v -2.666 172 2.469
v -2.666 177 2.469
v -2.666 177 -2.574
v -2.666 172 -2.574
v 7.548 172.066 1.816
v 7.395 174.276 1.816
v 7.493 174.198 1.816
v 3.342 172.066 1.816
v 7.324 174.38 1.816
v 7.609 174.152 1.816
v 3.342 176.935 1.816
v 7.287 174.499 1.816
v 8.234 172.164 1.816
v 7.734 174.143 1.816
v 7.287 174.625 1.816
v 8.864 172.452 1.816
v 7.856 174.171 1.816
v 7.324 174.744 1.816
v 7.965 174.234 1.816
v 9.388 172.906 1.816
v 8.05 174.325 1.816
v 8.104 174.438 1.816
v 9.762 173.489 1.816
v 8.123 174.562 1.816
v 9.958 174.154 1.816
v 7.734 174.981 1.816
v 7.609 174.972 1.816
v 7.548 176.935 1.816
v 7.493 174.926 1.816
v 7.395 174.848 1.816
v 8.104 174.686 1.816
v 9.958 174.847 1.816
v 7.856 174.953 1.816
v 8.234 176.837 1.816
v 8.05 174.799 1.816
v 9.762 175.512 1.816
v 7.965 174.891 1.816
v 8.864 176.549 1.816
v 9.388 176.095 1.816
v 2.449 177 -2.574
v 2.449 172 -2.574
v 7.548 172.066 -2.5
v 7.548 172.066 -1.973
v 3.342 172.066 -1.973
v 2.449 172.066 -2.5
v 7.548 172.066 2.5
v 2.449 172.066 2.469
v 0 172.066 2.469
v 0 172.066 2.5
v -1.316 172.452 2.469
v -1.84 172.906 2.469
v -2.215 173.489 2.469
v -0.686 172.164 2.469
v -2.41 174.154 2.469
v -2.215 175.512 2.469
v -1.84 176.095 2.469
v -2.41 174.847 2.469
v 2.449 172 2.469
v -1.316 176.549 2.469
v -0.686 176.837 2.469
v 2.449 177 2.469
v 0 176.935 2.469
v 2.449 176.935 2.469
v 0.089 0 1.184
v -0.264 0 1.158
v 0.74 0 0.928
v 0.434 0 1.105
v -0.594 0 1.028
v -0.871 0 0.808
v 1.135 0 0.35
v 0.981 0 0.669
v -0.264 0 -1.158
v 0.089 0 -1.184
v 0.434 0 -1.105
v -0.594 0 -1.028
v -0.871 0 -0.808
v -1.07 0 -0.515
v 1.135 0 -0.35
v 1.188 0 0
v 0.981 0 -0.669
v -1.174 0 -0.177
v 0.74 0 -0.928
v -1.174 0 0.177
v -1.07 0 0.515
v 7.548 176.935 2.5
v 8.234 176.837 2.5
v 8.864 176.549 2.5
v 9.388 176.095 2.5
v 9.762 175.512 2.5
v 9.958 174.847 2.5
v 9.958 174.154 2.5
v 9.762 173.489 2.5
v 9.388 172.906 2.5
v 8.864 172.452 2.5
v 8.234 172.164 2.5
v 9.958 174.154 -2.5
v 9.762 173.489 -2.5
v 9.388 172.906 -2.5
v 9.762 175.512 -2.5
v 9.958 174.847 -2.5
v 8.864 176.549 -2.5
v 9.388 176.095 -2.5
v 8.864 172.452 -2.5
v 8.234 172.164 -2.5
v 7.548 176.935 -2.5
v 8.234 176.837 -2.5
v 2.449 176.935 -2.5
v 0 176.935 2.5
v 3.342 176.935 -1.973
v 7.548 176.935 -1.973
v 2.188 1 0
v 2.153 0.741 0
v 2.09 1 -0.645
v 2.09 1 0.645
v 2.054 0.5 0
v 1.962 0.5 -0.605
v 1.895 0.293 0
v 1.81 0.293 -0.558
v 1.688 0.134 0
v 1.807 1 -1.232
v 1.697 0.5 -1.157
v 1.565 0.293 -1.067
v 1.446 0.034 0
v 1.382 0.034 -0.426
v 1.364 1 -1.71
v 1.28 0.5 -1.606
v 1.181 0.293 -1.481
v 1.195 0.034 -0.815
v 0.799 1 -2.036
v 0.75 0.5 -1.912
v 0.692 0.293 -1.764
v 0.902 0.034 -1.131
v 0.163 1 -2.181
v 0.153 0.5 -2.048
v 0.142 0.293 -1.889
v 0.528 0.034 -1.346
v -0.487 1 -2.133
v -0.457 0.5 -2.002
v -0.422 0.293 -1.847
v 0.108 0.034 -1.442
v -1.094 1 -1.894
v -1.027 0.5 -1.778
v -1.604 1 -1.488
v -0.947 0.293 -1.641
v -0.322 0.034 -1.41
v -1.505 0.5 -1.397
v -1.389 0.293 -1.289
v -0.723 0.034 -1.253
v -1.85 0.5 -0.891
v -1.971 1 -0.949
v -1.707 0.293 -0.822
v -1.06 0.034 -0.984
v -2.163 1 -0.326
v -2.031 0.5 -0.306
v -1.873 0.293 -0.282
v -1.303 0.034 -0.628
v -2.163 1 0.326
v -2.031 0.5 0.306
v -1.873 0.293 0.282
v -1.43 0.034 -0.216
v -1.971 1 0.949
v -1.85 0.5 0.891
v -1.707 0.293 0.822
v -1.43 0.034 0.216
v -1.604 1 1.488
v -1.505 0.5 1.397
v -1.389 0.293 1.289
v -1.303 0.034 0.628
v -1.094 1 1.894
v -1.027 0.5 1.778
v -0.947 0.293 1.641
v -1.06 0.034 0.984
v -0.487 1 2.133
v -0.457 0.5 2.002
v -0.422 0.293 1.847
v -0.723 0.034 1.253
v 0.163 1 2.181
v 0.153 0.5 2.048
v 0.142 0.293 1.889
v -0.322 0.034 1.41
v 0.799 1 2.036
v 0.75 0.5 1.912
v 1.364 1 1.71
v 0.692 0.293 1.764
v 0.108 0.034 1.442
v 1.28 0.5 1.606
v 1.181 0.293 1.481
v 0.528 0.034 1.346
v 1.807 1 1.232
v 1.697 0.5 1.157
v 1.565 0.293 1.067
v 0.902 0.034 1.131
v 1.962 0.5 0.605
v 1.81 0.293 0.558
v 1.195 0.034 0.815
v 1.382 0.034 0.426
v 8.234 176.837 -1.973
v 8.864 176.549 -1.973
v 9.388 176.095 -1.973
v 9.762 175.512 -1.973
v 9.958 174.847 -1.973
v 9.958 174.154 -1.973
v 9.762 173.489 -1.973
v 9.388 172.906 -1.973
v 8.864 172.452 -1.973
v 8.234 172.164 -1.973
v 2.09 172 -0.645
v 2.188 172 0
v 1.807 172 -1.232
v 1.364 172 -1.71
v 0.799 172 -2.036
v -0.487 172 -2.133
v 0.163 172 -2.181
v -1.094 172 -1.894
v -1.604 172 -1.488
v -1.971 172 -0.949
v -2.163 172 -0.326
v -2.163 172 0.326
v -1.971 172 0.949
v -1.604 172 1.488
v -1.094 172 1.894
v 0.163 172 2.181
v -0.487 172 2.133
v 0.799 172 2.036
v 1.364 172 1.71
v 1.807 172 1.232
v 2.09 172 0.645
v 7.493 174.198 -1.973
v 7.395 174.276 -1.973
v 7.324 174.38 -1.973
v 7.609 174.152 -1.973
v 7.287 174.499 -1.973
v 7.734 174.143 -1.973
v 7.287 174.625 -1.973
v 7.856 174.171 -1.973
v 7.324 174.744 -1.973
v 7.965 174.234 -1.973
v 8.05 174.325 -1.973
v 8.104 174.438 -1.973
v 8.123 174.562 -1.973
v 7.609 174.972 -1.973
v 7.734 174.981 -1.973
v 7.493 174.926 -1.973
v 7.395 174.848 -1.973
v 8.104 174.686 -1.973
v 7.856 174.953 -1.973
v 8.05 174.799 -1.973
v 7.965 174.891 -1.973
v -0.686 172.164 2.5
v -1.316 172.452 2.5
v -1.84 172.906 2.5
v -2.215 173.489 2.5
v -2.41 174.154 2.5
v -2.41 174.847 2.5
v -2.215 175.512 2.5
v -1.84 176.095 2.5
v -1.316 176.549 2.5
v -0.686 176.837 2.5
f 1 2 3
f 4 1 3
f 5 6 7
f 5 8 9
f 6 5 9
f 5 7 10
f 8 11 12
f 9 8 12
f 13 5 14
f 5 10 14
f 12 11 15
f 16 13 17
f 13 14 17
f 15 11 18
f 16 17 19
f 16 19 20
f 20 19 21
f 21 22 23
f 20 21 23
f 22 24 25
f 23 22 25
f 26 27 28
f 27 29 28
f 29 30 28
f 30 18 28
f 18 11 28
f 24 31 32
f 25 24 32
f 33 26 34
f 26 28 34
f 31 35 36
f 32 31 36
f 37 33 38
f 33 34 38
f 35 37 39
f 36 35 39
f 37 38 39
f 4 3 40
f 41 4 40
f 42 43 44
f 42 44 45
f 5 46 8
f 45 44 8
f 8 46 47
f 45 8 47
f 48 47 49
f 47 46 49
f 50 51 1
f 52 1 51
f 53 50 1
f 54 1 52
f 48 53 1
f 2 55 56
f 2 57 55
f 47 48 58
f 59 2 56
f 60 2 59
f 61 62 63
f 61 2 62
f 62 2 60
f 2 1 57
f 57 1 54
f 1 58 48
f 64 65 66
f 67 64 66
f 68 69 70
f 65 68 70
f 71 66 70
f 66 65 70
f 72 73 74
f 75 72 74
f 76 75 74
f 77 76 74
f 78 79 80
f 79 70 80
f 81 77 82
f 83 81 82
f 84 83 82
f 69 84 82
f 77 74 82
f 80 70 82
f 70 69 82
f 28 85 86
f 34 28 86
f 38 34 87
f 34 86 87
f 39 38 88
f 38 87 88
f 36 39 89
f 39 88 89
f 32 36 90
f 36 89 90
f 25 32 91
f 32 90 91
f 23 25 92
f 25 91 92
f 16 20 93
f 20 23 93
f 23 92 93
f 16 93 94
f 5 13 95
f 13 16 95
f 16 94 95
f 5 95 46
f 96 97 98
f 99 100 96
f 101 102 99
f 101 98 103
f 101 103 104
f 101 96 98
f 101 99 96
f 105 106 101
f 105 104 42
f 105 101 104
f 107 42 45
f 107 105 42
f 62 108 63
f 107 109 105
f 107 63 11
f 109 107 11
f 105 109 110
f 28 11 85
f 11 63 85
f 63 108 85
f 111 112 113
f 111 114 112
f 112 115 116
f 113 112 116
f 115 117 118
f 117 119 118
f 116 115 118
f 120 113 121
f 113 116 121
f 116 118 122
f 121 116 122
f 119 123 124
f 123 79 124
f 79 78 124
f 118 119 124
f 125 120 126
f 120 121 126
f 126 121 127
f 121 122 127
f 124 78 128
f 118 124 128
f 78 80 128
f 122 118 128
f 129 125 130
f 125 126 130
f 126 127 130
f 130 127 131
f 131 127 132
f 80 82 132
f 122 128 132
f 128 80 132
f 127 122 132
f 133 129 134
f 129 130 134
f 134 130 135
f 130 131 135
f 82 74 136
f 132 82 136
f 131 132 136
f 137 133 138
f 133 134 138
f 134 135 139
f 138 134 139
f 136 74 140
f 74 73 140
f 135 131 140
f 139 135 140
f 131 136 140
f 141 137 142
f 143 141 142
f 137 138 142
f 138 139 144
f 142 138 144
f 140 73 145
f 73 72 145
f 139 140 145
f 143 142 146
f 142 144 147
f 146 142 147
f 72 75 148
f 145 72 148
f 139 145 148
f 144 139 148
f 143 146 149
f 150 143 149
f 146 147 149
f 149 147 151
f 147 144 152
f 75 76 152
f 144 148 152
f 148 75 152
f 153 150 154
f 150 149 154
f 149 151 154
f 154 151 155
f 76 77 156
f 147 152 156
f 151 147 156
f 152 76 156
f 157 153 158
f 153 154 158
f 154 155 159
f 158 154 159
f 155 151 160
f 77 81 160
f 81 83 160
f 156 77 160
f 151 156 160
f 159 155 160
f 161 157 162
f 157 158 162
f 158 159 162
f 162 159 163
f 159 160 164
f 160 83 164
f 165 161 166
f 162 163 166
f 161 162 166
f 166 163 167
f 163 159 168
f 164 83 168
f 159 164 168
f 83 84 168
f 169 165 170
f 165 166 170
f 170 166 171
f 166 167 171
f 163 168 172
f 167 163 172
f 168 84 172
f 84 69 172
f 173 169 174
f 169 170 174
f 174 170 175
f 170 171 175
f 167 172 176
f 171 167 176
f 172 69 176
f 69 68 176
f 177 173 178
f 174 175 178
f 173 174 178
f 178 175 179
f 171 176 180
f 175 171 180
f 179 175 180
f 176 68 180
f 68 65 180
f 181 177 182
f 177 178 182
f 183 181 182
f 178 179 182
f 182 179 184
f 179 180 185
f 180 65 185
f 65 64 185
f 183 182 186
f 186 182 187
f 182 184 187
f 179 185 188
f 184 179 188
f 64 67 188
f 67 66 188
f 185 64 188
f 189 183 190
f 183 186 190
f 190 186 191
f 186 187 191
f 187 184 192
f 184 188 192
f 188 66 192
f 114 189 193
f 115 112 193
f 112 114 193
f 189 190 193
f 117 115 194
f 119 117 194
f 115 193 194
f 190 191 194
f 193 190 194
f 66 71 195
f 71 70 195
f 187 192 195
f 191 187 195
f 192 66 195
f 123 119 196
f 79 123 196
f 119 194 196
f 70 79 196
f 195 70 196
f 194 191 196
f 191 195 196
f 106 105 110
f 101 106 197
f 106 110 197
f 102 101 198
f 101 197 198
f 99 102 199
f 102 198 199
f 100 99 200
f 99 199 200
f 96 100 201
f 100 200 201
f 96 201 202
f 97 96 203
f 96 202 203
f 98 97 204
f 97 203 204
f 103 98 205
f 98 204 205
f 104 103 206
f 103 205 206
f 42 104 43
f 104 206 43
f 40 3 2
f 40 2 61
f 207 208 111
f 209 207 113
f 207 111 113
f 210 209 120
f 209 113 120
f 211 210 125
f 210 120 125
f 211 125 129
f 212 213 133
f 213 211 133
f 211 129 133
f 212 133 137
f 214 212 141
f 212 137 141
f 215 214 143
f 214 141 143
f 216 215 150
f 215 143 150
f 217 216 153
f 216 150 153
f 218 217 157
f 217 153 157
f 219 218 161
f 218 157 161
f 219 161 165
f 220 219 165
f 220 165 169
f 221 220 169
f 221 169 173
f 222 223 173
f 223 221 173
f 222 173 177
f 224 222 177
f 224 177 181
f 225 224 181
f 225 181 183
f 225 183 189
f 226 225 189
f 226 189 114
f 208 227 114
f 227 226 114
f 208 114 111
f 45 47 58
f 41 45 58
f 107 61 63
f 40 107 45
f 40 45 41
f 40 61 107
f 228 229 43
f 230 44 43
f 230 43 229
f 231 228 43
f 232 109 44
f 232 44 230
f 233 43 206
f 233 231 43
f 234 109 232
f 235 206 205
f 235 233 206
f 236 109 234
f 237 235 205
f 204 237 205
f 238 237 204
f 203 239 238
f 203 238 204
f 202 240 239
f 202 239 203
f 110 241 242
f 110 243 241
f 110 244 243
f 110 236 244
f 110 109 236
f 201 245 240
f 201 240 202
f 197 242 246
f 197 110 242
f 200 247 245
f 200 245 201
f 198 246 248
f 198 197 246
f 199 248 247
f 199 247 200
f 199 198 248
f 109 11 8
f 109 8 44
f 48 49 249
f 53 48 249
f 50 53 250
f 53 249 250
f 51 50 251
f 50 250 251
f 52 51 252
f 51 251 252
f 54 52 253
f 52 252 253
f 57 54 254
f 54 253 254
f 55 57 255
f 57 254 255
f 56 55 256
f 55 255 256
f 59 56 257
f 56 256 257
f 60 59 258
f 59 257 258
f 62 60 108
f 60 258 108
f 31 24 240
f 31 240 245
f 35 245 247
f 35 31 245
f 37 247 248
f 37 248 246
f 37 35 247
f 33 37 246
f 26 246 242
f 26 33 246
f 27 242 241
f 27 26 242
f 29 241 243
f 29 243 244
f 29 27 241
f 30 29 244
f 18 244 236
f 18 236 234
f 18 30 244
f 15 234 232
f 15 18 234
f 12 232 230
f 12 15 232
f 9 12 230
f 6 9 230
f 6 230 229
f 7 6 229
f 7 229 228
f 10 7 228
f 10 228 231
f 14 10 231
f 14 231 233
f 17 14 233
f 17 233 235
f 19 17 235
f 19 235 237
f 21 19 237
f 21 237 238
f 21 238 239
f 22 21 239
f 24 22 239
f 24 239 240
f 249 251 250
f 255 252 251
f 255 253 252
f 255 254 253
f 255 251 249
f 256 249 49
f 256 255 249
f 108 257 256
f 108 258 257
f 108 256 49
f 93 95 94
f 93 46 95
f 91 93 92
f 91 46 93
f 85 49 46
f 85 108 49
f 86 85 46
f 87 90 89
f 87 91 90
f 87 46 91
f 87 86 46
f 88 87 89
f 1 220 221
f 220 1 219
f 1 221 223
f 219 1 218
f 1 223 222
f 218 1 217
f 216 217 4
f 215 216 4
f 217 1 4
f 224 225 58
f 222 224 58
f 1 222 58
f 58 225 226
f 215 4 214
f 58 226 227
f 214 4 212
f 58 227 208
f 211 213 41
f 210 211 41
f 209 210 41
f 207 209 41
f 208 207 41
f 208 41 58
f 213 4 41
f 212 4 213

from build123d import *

# Parameters (mm, degrees)
IZIM1_R                     = 2.187508585
Y_KSEKLIK_EKSTR_ZYON1_DEPTH = 177
RADYUS1_R                   = 1
IZIM2_W                     = 5.115236905
IZIM2_H                     = 5.042987796
Y_KSEKLIK_EKSTR_ZYON2_DEPTH = 5
Y_KSEKLIK_EKSTR_ZYON3_DEPTH = 2.5
IZIM4_W                     = 9.955982426
IZIM4_H                     = 3.788849983
KES_EKSTR_ZYON1_DEPTH       = 5
IZIM5_R                     = 0.420224292
Y_KSEKLIK_EKSTR_ZYON4_DEPTH = 5


with BuildPart() as part:
    # Çizim1 → Yükseklik-Ekstrüzyon1 (new body)
    with BuildSketch(Plane(origin=(0, 0, 0), x_dir=(1, 0, 0), z_dir=(0, 1, 0))):
        Circle(IZIM1_R)
    extrude(amount=Y_KSEKLIK_EKSTR_ZYON1_DEPTH)

    # Radyus1
    radyus1_edges = [part.edges().sort_by_distance(p)[0] for p in [
        (-2.187508585, 0, 0),
    ]]
    fillet(radyus1_edges, radius=RADYUS1_R)

    # Çizim2 → Yükseklik-Ekstrüzyon2 (add)
    with BuildSketch(Plane(origin=(0, 177, 0), x_dir=(1, 0, 0), z_dir=(0, 1, 0))):
        with Locations((-0.108373663, 0.052171697)):
            Rectangle(IZIM2_W, IZIM2_H)
    extrude(amount=-Y_KSEKLIK_EKSTR_ZYON2_DEPTH)

    # Çizim3 → Yükseklik-Ekstrüzyon3 (add, symmetric)
    with BuildSketch(Plane.XY):
        with BuildLine():
            Line((0, 176.935410542), (7.547644812, 176.935410542))
            ThreePointArc((7.547644812, 176.935410542), (9.98246541, 174.500589945), (7.547644812, 172.065769347))
            Line((7.547644812, 172.065769347), (0, 172.065769347))
            ThreePointArc((0, 172.065769347), (-2.434820598, 174.500589945), (0, 176.935410542))
        make_face()
    extrude(amount=Y_KSEKLIK_EKSTR_ZYON3_DEPTH, both=True)

    # Çizim4 → Kes-Ekstrüzyon1 (cut)
    with BuildSketch(Plane(origin=(0, 176.935410542, 0), x_dir=(1, 0, 0), z_dir=(0, 1, 0))):
        with Locations((8.319846031, 0.078445098)):
            Rectangle(IZIM4_W, IZIM4_H)
    extrude(amount=-KES_EKSTR_ZYON1_DEPTH, mode=Mode.SUBTRACT)

    # Çizim5 → Yükseklik-Ekstrüzyon4 (add)
    with BuildSketch(Plane.XY.offset(2.5)):
        with Locations((7.702816728, 174.562062813)):
            Circle(IZIM5_R)
    extrude(amount=-Y_KSEKLIK_EKSTR_ZYON4_DEPTH)


solid = part.part
